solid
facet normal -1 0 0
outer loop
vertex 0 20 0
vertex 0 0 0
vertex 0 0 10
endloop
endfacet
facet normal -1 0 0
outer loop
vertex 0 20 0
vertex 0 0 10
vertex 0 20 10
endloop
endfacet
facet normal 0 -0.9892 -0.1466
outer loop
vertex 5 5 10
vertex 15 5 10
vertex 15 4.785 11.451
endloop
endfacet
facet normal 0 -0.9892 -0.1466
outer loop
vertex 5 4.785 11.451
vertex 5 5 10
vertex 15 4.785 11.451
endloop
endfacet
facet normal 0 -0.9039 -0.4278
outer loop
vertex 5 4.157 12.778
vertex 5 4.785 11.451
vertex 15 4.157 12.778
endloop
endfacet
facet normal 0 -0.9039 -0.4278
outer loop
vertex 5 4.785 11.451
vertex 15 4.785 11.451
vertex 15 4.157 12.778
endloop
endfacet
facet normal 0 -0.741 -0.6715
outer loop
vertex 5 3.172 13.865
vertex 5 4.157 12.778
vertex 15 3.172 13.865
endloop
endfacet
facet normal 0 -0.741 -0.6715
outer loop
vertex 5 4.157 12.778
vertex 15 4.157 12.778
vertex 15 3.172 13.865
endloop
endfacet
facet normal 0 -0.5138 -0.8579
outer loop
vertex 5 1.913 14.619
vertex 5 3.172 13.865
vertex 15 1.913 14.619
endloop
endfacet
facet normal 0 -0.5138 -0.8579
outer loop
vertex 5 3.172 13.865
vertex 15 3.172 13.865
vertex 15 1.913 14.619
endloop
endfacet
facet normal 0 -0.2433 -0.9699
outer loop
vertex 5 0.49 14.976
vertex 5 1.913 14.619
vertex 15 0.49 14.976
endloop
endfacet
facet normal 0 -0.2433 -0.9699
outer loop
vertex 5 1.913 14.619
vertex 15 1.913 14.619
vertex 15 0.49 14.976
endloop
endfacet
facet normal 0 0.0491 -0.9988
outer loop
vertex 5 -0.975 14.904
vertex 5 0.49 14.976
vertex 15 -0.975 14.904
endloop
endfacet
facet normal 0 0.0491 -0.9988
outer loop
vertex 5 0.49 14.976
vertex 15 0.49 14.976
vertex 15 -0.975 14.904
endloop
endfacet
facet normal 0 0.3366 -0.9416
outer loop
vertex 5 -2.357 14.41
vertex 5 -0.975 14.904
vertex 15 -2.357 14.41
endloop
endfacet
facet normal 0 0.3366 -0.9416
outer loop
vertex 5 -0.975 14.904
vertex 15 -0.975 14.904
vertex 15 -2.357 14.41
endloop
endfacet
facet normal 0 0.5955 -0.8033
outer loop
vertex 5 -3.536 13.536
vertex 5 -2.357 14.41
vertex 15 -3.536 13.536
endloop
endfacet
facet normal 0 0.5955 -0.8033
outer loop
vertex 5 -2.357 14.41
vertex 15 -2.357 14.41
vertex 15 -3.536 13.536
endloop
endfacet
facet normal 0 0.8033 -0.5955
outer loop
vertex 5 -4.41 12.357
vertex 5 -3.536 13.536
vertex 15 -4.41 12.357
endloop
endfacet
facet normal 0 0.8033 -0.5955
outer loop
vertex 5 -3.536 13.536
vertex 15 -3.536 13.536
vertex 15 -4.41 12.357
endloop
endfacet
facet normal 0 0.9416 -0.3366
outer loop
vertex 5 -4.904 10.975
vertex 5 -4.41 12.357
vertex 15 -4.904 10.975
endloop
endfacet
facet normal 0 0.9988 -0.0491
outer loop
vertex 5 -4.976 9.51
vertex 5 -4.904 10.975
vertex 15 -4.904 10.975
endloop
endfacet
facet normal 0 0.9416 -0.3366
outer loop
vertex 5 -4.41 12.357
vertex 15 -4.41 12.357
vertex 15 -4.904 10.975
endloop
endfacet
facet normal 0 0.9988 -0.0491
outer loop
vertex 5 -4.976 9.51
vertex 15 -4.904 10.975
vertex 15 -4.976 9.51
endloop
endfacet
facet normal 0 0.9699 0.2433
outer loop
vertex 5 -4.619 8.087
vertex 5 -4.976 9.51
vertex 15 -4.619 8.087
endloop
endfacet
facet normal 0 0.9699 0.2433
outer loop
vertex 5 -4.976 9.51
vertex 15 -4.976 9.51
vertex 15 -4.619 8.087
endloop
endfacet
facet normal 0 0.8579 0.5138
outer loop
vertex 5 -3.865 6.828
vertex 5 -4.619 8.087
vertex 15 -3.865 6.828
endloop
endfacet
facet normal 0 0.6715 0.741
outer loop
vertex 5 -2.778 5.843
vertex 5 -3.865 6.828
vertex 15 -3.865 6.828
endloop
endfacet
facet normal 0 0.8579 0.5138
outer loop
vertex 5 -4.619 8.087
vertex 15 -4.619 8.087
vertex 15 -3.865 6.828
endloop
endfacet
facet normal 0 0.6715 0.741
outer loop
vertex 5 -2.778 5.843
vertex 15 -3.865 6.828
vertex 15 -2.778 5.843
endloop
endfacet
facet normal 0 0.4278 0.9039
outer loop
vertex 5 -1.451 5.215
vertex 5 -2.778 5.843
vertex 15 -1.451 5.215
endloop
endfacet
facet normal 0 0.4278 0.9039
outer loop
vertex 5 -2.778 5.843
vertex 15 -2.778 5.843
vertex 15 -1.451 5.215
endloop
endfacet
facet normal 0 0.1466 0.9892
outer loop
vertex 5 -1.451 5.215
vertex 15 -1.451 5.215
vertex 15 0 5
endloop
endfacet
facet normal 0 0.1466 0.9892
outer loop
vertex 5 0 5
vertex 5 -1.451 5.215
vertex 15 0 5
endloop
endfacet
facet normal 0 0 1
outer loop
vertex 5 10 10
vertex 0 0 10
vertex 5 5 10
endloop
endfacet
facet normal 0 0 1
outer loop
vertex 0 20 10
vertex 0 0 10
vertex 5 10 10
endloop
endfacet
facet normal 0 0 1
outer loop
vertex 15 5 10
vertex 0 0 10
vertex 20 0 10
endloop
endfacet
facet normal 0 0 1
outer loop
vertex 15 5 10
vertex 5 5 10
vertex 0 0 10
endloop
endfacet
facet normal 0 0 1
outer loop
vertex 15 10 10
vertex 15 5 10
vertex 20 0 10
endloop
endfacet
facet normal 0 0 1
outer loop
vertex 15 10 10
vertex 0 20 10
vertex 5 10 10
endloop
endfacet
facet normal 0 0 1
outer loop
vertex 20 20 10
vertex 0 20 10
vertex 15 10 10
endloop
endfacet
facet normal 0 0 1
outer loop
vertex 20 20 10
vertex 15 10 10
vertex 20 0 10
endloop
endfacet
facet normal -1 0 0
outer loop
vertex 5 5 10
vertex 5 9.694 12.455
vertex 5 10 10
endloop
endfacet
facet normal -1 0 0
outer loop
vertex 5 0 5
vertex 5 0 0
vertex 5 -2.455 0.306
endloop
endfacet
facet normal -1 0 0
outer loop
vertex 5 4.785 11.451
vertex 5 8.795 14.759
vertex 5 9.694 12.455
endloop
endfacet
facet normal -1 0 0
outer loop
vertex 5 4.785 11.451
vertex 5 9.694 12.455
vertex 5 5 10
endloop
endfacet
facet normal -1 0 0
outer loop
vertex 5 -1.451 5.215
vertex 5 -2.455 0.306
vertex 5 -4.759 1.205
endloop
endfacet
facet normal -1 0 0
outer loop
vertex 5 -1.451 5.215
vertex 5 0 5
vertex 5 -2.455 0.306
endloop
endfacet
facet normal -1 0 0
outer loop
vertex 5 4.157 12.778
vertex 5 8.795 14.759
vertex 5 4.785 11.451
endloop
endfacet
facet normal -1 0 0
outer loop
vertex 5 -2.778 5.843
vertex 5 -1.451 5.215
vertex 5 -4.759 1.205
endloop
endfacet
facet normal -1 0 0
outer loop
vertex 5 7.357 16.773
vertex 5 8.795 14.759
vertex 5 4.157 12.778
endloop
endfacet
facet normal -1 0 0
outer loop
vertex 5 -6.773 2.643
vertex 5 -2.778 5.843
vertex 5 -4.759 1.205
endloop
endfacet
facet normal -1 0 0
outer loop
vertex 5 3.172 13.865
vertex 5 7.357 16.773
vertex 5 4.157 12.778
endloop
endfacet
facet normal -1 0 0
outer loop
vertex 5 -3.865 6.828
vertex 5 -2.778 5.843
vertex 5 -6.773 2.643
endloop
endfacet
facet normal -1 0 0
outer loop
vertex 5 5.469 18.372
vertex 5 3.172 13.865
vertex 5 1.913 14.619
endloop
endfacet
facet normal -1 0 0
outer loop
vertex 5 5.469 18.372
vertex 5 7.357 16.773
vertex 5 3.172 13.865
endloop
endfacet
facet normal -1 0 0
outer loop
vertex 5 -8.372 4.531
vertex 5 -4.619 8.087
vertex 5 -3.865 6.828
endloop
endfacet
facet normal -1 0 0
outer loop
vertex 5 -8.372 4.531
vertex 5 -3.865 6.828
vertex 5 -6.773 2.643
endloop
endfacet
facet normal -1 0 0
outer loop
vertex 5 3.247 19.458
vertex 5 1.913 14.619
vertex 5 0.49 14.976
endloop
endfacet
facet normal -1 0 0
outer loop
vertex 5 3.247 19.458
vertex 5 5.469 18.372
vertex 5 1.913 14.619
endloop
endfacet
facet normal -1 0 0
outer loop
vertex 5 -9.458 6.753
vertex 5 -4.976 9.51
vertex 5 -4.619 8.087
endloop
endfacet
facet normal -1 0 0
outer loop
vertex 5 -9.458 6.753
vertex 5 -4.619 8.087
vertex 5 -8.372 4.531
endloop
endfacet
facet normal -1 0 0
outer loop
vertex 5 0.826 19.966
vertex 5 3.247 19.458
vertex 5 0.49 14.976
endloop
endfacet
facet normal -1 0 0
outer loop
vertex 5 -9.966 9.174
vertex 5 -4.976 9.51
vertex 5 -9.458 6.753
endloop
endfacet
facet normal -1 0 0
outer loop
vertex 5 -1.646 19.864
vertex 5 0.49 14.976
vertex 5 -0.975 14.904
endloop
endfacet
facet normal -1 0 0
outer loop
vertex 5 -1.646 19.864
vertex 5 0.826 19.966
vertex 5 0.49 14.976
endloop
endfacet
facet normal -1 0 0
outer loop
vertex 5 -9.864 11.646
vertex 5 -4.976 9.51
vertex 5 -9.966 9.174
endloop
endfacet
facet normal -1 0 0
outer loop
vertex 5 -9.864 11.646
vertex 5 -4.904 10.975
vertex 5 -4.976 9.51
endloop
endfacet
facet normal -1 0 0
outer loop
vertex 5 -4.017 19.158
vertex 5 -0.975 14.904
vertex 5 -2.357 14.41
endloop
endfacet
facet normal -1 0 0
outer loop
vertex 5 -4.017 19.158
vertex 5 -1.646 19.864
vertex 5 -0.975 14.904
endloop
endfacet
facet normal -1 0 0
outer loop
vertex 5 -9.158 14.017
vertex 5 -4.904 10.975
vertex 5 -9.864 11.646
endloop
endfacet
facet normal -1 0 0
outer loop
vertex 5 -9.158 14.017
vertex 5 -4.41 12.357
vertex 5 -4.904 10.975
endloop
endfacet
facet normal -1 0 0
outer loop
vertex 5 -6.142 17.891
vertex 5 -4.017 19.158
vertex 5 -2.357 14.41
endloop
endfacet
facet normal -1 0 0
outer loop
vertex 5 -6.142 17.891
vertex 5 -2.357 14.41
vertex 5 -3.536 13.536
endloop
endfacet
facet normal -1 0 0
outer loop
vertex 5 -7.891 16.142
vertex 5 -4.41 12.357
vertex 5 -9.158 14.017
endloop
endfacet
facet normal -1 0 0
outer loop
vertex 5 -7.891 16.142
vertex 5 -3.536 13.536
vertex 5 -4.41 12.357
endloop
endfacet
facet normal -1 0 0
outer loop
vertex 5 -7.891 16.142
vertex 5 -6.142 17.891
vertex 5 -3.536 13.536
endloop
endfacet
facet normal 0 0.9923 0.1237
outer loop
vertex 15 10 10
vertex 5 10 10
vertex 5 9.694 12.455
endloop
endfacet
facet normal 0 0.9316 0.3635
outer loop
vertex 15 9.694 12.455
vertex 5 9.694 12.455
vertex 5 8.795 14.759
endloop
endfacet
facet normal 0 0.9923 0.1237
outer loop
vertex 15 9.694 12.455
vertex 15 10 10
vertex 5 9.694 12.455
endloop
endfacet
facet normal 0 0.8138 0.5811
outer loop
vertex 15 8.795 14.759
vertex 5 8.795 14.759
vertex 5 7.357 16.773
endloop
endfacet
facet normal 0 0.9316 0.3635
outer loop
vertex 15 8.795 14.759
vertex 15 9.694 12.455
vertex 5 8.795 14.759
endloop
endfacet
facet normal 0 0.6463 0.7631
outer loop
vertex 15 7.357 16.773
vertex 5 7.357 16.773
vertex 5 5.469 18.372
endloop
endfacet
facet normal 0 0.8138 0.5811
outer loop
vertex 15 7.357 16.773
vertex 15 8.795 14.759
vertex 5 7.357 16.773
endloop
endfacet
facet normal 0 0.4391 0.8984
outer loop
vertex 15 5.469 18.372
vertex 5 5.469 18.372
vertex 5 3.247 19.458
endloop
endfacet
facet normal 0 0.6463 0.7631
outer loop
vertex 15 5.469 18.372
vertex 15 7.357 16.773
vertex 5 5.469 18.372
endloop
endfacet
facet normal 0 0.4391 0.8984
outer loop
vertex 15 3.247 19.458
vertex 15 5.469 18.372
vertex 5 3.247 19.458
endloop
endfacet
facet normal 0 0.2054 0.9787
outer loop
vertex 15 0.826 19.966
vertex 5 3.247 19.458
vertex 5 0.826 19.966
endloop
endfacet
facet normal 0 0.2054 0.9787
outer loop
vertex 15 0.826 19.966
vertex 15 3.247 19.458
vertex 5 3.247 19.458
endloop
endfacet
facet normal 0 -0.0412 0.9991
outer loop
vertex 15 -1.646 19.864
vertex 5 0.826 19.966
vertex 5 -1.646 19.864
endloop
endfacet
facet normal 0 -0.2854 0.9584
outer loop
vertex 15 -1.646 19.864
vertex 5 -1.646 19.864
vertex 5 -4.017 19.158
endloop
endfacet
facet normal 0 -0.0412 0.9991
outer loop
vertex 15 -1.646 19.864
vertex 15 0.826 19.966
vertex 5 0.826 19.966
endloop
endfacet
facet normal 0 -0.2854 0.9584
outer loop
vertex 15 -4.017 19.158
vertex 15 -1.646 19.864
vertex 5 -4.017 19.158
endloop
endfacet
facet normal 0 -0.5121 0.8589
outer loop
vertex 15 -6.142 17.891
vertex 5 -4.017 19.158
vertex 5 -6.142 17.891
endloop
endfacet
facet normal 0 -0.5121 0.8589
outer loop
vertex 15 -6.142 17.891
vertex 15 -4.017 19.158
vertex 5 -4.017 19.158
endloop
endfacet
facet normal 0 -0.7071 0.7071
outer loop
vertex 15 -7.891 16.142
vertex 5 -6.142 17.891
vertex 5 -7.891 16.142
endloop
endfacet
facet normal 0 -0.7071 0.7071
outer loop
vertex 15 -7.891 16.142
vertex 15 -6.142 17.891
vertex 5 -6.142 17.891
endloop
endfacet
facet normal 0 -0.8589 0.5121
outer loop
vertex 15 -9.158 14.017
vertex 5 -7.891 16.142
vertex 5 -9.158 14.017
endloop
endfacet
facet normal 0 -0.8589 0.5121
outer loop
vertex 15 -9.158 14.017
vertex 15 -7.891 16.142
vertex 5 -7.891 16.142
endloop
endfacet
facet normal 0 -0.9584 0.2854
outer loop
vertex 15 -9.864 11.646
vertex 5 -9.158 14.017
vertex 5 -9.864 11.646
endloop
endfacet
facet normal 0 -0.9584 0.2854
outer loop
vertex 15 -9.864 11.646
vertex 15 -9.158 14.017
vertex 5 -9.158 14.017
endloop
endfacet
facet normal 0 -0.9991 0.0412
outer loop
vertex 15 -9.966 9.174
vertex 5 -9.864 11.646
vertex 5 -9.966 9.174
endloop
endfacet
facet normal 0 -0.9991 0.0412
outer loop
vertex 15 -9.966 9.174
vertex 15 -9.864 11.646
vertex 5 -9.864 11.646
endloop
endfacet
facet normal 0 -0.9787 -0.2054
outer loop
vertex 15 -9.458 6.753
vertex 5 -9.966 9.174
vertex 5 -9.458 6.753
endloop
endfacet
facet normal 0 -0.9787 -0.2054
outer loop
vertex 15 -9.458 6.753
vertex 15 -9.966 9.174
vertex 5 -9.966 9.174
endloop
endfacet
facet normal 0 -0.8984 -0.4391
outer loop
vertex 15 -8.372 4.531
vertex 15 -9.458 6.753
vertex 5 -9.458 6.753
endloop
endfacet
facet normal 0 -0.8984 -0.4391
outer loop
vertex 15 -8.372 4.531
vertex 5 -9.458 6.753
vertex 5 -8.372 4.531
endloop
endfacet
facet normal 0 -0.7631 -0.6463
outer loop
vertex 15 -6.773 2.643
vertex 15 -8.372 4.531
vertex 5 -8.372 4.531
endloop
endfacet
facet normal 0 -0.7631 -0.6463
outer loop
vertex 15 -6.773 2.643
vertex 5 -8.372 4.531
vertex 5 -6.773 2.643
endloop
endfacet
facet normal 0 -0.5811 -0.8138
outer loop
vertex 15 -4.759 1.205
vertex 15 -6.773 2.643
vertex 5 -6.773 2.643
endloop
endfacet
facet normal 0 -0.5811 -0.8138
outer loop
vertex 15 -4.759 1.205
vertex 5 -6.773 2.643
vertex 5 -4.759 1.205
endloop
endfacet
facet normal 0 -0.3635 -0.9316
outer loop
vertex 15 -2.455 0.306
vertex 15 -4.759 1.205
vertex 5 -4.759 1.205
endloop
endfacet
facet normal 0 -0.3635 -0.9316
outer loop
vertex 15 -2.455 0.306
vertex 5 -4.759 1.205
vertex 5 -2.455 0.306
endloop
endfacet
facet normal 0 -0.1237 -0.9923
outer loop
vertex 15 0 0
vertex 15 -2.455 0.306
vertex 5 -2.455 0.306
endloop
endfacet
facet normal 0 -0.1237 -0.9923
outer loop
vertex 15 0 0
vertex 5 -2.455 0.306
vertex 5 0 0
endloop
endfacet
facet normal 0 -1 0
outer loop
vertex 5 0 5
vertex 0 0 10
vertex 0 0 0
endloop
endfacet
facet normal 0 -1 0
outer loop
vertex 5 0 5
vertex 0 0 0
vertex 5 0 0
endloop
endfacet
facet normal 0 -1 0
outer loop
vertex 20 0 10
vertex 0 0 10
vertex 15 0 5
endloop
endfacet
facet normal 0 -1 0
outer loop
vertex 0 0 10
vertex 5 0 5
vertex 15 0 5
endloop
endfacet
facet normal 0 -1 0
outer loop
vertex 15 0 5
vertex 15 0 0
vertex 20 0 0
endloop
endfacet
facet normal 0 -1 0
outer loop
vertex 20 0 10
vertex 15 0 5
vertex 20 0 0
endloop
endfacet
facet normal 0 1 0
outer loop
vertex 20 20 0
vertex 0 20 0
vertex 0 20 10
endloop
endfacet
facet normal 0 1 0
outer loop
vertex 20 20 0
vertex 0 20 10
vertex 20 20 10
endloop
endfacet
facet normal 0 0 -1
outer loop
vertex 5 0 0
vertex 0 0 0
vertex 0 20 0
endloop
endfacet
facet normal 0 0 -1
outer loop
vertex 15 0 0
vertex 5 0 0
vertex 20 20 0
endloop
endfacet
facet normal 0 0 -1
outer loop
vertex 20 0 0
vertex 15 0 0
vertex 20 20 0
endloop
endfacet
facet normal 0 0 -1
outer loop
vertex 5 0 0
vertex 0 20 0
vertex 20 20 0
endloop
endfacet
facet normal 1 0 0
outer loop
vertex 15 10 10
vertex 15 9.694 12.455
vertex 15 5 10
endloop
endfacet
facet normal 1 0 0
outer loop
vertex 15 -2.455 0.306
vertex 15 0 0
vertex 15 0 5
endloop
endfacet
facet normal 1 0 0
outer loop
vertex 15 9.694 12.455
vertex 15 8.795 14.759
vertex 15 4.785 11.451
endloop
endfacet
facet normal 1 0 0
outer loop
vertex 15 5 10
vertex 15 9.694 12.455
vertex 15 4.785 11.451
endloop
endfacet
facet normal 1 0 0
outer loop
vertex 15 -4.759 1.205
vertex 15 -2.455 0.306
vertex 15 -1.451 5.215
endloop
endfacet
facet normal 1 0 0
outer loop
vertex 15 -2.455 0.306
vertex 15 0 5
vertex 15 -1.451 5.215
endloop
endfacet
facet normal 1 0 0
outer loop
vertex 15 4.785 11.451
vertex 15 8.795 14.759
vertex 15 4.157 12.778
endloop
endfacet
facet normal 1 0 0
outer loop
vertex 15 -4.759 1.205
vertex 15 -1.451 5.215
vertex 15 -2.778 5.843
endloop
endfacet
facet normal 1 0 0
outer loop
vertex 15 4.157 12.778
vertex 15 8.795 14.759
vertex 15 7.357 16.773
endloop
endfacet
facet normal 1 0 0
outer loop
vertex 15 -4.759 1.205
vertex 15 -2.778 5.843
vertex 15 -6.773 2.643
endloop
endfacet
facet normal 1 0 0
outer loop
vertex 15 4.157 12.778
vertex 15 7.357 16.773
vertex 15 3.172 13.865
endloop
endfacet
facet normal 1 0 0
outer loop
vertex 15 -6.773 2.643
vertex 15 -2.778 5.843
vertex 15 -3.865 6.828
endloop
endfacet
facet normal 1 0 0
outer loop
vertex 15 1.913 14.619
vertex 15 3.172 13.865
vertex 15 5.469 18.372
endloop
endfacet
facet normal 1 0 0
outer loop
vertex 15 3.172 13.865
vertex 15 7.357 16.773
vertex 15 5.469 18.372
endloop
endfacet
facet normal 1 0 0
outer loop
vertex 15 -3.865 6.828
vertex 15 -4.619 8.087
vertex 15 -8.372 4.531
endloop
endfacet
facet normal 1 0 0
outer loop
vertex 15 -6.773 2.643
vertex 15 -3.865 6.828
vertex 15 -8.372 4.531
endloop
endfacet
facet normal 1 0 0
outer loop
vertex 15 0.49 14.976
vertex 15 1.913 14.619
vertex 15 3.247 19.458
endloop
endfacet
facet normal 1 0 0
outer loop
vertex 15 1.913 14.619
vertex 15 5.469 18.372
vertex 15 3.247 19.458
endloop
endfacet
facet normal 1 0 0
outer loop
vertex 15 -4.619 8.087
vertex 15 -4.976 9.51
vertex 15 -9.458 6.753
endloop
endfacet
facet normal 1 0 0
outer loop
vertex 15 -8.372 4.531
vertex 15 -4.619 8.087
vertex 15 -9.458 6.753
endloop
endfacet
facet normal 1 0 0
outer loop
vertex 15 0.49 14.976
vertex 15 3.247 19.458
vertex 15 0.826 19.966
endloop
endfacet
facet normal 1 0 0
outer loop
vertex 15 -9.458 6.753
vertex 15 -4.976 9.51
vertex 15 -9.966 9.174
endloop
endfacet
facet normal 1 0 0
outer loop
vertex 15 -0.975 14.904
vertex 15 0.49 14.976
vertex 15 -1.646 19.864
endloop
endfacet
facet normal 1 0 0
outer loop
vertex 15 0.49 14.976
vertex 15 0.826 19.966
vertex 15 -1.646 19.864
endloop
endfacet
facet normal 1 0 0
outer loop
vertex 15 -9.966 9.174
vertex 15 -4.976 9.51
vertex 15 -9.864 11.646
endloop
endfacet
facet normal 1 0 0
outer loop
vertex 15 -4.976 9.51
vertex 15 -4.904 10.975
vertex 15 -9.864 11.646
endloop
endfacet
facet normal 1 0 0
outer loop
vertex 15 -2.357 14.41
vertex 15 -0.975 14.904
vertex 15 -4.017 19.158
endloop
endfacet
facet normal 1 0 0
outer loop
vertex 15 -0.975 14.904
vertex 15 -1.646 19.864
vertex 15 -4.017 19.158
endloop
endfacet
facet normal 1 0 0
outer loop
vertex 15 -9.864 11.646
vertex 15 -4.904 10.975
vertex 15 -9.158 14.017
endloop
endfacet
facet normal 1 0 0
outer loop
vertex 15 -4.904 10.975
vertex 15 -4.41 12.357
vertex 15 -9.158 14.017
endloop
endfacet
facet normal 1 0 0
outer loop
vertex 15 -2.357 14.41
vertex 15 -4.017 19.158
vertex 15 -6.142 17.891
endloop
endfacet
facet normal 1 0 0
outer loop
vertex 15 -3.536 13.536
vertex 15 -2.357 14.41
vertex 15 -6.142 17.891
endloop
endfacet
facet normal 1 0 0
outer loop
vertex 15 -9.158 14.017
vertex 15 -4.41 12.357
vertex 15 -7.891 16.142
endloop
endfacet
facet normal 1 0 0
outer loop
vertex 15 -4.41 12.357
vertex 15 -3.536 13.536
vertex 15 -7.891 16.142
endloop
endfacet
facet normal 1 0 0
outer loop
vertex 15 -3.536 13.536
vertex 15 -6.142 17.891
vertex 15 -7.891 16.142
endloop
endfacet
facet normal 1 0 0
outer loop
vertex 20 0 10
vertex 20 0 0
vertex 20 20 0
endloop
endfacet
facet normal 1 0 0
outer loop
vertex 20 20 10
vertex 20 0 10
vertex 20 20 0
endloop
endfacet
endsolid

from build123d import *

# Parameters (mm, degrees)
SKETCH_1_W    = 20
SKETCH_1_H    = 20
BASEBOX_DEPTH = 10
SKETCH_2_W    = 10
SKETCH_2_H    = 5


with BuildPart() as part:
    # 草图1 → BaseBox (new body)
    with BuildSketch(Plane.XY):
        with Locations((10, 10)):
            Rectangle(SKETCH_1_W, SKETCH_1_H)
    extrude(amount=BASEBOX_DEPTH)

    # 草图2 → RevolveAxisEdge (revolve)
    with BuildSketch(Plane.XY.offset(10)):
        with Locations((10, 7.5)):
            Rectangle(SKETCH_2_W, SKETCH_2_H)
    revolve(axis=Axis((0, 0, 10), (1, 0, 0)))


solid = part.part
